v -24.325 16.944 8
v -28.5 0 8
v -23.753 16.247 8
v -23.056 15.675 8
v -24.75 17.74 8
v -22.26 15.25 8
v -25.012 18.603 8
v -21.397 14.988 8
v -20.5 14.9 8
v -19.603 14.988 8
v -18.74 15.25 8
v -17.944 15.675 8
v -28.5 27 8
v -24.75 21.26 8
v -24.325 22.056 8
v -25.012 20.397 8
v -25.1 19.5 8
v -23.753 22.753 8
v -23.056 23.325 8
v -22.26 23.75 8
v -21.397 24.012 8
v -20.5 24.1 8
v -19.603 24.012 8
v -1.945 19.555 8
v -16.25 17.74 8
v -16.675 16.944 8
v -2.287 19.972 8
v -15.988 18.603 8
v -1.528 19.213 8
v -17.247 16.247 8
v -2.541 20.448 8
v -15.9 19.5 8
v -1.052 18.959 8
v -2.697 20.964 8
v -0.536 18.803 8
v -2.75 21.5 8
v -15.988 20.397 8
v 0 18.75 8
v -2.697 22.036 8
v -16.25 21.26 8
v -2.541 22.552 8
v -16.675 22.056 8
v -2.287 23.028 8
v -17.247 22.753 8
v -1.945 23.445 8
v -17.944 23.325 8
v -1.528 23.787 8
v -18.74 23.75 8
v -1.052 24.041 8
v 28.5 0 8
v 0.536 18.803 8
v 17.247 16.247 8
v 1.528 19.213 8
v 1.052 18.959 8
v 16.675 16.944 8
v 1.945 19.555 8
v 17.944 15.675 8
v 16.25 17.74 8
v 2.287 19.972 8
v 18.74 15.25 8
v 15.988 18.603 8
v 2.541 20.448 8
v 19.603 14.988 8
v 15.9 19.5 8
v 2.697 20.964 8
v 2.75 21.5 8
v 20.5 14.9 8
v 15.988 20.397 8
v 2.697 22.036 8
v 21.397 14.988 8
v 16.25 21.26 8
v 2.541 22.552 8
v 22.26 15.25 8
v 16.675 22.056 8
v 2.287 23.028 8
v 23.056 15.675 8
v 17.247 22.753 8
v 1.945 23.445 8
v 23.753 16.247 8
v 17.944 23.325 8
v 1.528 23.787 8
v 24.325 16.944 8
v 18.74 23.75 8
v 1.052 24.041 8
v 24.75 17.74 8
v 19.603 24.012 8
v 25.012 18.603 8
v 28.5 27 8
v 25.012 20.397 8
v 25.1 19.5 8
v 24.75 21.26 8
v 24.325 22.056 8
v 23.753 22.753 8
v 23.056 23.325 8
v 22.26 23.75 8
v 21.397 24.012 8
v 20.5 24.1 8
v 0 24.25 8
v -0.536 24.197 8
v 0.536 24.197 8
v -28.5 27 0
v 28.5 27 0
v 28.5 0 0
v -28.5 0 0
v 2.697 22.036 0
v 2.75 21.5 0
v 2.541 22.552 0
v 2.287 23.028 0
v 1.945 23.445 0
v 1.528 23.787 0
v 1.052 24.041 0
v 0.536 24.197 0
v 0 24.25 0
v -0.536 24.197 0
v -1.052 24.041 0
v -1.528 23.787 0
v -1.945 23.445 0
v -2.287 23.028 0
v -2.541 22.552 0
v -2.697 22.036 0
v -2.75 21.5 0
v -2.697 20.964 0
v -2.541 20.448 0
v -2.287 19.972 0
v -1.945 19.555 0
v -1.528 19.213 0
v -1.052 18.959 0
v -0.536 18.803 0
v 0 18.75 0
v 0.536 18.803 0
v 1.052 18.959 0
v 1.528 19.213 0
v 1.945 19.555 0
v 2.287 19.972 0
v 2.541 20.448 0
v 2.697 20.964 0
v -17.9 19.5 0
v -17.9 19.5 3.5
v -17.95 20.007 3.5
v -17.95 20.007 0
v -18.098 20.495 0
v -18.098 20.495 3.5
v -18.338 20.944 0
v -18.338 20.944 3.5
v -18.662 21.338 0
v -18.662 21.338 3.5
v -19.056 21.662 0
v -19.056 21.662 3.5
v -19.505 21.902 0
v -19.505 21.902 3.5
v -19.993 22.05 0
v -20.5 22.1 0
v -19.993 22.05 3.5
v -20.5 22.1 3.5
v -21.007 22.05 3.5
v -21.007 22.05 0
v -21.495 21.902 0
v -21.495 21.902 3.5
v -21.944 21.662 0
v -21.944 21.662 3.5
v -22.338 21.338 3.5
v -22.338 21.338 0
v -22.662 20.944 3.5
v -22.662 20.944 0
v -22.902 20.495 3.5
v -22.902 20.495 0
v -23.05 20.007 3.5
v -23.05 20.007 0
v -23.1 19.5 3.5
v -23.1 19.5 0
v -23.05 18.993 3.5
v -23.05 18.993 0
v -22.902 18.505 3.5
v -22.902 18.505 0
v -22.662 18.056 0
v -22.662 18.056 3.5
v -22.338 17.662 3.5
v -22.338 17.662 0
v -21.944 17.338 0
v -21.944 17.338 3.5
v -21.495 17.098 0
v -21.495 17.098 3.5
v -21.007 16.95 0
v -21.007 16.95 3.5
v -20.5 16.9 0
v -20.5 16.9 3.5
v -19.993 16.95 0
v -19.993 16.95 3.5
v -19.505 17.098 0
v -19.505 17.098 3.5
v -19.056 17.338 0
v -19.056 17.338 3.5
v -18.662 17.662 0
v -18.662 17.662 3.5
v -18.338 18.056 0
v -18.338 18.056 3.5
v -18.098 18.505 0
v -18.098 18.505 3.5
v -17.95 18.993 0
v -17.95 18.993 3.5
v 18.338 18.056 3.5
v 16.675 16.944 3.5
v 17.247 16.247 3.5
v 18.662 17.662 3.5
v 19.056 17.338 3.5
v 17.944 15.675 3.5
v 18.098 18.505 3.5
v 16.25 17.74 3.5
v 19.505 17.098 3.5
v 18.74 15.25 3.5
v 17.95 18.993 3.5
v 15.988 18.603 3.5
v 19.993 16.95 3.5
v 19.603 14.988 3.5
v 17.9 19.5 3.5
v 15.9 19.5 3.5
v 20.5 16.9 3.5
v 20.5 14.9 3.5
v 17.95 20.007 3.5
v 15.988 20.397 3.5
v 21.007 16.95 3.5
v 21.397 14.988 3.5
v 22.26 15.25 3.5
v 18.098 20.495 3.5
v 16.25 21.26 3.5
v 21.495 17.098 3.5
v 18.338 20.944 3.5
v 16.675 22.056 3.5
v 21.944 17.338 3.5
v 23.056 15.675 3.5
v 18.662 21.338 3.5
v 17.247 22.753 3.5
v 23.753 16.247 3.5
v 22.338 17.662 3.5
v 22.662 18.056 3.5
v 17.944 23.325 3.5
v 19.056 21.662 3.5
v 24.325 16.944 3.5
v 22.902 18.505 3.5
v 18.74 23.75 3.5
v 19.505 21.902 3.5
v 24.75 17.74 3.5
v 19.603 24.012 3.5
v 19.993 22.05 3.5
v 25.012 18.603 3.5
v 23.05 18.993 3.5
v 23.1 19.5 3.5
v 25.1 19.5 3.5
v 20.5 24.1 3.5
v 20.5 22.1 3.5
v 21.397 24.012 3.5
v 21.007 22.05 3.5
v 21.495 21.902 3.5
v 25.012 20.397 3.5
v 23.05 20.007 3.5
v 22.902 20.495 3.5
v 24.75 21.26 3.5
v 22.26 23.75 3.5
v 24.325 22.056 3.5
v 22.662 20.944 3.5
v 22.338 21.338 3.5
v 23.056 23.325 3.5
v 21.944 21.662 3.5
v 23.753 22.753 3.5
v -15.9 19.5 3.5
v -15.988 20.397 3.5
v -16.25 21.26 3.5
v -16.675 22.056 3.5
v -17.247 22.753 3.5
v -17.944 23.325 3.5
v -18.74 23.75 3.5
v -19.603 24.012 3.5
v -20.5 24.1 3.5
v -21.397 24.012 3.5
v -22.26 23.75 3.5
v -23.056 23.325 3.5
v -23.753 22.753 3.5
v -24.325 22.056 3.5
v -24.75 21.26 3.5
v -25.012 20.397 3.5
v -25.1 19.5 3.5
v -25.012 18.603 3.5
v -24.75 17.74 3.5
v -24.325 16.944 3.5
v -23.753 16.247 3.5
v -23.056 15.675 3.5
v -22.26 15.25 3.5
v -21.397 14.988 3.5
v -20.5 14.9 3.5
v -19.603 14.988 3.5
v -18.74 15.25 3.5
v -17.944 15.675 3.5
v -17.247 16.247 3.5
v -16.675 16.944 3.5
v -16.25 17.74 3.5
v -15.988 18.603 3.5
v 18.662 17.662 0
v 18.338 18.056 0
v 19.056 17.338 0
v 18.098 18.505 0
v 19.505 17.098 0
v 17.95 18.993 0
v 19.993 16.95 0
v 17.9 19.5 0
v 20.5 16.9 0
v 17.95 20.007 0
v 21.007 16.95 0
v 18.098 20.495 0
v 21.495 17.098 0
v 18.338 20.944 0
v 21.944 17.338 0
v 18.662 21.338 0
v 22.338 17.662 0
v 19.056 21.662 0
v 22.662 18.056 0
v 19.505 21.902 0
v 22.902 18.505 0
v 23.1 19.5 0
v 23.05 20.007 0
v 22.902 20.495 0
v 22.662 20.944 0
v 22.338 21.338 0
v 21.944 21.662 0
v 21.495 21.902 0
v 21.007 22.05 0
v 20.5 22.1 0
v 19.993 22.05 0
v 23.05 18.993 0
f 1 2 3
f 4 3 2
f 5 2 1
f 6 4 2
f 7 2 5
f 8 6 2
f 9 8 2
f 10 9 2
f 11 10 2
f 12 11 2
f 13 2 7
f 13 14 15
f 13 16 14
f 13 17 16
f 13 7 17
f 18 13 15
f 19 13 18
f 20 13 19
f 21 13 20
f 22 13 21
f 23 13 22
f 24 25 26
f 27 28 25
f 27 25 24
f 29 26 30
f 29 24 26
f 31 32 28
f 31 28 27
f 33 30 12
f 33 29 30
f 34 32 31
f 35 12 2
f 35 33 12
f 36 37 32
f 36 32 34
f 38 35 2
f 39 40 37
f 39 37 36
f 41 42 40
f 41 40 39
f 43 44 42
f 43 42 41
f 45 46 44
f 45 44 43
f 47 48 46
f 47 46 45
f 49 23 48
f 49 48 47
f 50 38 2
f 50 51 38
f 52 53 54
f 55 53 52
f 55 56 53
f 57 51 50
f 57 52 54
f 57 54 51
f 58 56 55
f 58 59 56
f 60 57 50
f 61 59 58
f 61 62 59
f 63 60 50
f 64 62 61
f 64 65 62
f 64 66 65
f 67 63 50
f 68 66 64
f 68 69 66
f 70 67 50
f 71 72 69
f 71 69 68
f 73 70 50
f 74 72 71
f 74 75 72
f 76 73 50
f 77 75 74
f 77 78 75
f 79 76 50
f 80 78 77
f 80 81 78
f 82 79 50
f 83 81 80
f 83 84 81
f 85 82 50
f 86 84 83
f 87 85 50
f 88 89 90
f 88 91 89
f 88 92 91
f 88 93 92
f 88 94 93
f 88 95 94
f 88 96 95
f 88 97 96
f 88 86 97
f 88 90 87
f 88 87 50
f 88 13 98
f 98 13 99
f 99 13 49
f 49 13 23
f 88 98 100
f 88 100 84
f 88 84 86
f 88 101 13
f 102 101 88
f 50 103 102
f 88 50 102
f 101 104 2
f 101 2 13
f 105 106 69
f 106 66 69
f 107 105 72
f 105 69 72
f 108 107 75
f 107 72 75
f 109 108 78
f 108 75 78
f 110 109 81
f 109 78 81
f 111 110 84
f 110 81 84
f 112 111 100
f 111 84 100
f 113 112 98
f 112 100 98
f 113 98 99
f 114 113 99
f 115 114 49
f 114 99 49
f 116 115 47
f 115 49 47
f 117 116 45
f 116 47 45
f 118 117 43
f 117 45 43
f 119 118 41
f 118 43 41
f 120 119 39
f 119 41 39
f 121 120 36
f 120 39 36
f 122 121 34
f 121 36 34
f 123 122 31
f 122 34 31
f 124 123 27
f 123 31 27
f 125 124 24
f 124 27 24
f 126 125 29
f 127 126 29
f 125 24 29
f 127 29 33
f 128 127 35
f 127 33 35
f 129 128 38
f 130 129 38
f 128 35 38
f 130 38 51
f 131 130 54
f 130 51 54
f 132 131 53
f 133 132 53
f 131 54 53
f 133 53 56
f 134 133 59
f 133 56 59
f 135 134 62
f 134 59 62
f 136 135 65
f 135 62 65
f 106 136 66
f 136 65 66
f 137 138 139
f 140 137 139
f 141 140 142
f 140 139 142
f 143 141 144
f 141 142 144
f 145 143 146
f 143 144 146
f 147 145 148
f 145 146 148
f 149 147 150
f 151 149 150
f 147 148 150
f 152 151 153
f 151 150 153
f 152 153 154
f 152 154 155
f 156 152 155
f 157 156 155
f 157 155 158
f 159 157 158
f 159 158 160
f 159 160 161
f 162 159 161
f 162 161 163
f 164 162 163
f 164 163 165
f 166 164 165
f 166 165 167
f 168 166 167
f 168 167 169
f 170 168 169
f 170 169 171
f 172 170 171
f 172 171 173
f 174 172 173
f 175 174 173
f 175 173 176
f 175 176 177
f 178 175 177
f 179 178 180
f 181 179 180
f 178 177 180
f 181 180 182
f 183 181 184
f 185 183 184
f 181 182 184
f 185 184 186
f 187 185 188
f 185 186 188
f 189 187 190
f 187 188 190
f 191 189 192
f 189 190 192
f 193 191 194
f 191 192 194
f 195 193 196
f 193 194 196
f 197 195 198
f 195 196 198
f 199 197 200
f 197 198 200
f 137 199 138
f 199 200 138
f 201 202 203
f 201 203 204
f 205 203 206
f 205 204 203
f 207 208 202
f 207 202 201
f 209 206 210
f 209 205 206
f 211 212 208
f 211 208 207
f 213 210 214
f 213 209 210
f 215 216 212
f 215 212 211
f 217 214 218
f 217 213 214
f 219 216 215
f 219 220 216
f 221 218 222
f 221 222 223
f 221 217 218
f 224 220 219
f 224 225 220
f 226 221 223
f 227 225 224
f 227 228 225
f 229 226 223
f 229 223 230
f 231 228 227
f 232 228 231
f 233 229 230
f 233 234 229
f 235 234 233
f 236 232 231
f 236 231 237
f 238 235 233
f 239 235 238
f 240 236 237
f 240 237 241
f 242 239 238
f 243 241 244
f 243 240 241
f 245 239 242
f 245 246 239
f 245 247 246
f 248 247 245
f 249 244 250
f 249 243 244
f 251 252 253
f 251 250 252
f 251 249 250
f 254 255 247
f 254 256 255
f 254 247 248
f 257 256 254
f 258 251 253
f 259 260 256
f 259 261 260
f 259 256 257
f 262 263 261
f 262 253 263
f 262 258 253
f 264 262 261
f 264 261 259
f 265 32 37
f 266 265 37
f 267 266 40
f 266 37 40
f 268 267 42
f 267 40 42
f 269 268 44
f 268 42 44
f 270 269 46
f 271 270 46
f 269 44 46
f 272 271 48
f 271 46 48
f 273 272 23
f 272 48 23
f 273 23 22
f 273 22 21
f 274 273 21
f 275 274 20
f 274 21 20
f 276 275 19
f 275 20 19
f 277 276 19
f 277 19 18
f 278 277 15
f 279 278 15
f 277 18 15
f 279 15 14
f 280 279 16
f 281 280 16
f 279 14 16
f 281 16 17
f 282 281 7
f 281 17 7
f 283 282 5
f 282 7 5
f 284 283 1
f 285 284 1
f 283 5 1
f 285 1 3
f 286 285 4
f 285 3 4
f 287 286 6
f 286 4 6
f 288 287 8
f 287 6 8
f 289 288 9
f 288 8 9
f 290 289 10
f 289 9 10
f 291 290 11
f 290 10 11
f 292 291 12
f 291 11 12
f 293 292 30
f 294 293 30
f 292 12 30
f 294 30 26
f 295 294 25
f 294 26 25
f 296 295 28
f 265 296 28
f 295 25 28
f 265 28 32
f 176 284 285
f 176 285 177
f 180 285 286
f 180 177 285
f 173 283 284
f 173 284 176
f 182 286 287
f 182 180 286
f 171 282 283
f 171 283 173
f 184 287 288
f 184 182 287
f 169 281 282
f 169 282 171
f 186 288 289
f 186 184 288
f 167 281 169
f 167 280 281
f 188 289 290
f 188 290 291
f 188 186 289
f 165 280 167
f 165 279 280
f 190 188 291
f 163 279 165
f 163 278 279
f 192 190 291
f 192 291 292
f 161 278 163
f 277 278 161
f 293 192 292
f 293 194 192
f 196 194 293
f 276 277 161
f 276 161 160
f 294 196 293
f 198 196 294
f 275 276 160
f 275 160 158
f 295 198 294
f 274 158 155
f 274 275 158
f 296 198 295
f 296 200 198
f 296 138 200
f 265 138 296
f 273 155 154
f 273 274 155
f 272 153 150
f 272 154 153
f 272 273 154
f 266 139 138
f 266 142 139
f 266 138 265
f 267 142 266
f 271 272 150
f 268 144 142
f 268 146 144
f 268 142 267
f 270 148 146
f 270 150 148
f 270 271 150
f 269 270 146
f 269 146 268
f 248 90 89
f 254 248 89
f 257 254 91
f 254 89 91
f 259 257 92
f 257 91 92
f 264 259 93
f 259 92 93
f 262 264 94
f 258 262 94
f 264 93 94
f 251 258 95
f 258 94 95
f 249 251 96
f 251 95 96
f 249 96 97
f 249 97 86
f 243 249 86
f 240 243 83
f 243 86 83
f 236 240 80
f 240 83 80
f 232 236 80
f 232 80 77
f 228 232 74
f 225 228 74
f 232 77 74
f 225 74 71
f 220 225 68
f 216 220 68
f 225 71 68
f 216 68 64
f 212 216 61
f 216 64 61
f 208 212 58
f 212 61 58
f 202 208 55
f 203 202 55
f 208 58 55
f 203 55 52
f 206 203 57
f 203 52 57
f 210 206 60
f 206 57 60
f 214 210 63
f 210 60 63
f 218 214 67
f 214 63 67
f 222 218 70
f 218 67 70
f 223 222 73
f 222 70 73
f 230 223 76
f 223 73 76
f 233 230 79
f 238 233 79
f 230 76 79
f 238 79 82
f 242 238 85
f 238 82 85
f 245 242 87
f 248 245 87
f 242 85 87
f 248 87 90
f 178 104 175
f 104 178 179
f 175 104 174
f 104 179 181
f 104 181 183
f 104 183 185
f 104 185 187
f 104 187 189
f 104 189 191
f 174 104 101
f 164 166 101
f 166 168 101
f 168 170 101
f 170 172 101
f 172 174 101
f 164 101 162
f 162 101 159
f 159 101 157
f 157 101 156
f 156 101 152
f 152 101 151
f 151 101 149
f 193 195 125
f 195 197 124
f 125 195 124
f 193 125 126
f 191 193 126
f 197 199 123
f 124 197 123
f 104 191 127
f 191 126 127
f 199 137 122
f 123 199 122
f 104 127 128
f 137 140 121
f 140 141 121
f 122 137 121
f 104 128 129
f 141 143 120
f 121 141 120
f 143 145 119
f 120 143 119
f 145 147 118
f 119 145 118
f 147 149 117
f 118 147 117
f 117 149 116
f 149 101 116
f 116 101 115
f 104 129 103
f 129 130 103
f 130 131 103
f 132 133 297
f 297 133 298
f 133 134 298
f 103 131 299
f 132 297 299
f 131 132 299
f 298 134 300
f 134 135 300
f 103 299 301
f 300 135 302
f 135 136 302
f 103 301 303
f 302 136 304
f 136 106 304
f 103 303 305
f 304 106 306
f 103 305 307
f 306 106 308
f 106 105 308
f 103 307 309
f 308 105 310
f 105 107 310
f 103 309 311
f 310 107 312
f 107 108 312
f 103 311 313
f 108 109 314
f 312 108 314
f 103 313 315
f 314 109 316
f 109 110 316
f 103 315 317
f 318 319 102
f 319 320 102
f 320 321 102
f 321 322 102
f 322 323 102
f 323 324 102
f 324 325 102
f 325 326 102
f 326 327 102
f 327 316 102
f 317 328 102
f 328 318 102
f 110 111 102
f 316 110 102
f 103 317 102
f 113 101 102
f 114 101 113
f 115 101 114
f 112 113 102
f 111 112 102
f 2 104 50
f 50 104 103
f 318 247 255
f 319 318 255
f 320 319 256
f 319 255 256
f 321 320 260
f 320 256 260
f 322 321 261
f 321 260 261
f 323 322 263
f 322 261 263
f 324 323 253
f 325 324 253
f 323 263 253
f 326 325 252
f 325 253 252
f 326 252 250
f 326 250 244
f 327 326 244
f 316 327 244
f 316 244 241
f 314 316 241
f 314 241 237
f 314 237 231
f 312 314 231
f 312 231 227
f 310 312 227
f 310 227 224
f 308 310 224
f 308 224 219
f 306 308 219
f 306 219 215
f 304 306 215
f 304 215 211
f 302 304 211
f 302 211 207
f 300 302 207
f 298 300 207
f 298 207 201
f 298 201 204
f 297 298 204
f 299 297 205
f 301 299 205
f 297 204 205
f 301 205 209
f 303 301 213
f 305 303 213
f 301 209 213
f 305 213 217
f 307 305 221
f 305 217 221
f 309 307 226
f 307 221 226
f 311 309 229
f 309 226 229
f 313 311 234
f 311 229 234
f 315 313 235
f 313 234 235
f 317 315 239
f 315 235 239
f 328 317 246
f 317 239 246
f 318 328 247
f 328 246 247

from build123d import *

# Parameters (mm, degrees)
F0_W     = 57
F0_H     = 27
F1_DEPTH = 8
F2_R     = 2.75
F2_R_2   = 2.6
F3_DEPTH = 9
F2_R_3   = 4.6
F4_DEPTH = 4.5


with BuildPart() as f1:
    # F0 (on Top) → F1 (new body)
    with BuildSketch(Plane.XY):
        with Locations((0, 13.5)):
            Rectangle(F0_W, F0_H)
    extrude(amount=F1_DEPTH)

    # F2 (on face) → F3 (cut)
    with BuildSketch(Plane.XY.offset(8)):
        with Locations((0, 21.5)):
            Circle(F2_R)
        with Locations((20.5, 19.5)):
            Circle(F2_R_2)
        with Locations((-20.5, 19.5)):
            Circle(F2_R_2)
    extrude(amount=-F3_DEPTH, mode=Mode.SUBTRACT)

    # F2 (on face) → F4 (cut)
    with BuildSketch(Plane.XY.offset(8)):
        with Locations((-20.5, 19.5)):
            Circle(F2_R_3)
        with Locations((-20.5, 19.5)):
            Circle(F2_R_2, mode=Mode.SUBTRACT)
        with Locations((20.5, 19.5)):
            Circle(F2_R_3)
        with Locations((20.5, 19.5)):
            Circle(F2_R_2, mode=Mode.SUBTRACT)
        with Locations((0, 21.5)):
            Circle(F2_R)
    extrude(amount=-F4_DEPTH, mode=Mode.SUBTRACT)


solid = f1.part
